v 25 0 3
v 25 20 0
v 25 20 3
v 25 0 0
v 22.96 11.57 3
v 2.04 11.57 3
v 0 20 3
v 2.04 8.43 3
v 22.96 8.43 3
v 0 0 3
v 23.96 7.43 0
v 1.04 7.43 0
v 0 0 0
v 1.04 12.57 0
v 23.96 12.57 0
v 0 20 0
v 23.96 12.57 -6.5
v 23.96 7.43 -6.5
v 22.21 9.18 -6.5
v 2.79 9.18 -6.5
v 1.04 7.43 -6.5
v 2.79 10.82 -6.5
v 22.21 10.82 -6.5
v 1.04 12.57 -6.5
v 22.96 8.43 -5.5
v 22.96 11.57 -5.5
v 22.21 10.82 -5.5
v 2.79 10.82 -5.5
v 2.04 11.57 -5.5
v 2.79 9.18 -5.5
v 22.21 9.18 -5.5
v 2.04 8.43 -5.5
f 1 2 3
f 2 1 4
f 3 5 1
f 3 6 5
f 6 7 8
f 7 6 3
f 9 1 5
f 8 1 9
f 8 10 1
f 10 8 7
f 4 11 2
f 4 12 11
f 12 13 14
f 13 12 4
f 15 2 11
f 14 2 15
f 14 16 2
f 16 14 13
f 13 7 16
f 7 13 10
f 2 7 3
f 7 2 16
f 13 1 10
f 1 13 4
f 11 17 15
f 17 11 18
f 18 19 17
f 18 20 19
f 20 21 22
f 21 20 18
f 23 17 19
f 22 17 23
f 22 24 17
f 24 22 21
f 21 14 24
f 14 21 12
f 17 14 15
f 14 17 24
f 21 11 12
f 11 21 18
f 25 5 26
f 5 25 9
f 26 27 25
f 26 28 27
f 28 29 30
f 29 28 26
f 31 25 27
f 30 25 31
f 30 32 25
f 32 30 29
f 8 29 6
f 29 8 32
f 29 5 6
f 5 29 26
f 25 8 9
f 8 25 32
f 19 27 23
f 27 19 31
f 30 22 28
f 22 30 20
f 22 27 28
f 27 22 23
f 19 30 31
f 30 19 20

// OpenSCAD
$fn = 50;

/**
 * A component to hold female pin headers.
 *
 * @param width            width of the component surface (x-axis)
 * @param length           length of the component surface (y-axis)
 * @param height           height of the component surface (z-axis)
 * @param width_pin_count  number of pins along the y-axis
 * @param length_pin_count number of pins along the y-axis
 */
module headers(width, length, height, width_pin_count, length_pin_count) {
  hole_width = (width_pin_count * 2.54) + 0.6;
  hole_length = (length_pin_count * 2.54) + 0.6;

  surround_height = 8.5;
  surround_thickness = 1.0;
  lip_width = 0.75;

  translate([width / 2, length / 2, height / 2]) {
    difference() {
      union() {
        // surface
        cube([width, length, height], true);

        // surround
        color([0, 1, 0], alpha = 0.5)
          translate([0, 0, (surround_height + surround_thickness - height) / -2])
            cube([
                hole_width + (surround_thickness * 2),
                hole_length + (surround_thickness * 2),
                surround_height + surround_thickness
              ], true);
      }

       // header body hole
      color([1, 0, 0])
        translate([0, 0, (surround_height - height) / -2])
          cube([hole_width, hole_length, surround_height], true);

      // pins hole
      color([0, 0, 1])
        translate([0, 0, (surround_height + height) / -2])
          cube([
              hole_width - (lip_width * 2),
              hole_length - (lip_width * 2),
              surround_thickness + 10
            ], true);

    }

  }
}

// Test the component
headers_length = 20;
headers_width = 25;
panel_thickness = 3;
headers(headers_width, headers_length, panel_thickness, 8, 1);
